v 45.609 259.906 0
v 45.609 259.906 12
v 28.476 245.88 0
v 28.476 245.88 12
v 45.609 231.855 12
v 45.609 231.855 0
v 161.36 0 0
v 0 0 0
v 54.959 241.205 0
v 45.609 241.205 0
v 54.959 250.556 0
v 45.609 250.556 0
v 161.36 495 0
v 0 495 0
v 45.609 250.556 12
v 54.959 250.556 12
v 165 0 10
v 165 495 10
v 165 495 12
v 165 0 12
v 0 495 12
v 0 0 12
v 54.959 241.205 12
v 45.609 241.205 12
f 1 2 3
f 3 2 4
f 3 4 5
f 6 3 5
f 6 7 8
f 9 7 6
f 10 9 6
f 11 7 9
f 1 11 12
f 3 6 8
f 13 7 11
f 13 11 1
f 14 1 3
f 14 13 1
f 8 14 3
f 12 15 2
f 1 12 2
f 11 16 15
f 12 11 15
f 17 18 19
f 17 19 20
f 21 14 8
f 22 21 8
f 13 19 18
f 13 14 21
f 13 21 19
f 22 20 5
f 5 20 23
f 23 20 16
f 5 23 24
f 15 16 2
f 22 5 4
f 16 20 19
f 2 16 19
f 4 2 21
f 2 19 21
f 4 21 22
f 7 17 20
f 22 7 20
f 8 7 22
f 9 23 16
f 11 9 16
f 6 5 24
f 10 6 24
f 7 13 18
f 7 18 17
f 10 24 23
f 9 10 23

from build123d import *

# Parameters (mm, degrees)
PAD_DEPTH     = 12
POCKET_DEPTH  = 12.001
CHAMFER_ANGLE = 20
CHAMFER_SIZE  = 10


with BuildPart() as part:
    # Sketch → Pad (new body)
    with BuildSketch(Plane.XY):
        Polygon((0, 495), (165, 495), (165, 0), (0, 0), (0, 247.5), align=None)
    extrude(amount=PAD_DEPTH)

    # Sketch001 (on Face7 of Pad) → Pocket (cut, through all)
    with BuildSketch(Plane.XY.offset(12)):
        Polygon((45.608967, 259.905869), (28.476261, 245.880386), (45.608967, 231.854903), (45.608967, 241.205225), (54.959289, 241.205225), (54.959289, 250.555547), (45.608967, 250.555547), align=None)
    extrude(amount=-POCKET_DEPTH, mode=Mode.SUBTRACT)

    # Chamfer
    chamfer_edges = [part.edges().sort_by_distance(p)[0] for p in [
        (165, 247.5, 0),
    ]]
    chamfer_side = part.faces().sort_by_distance((165, 247.5, 6))[0]
    chamfer(chamfer_edges, length=CHAMFER_SIZE, angle=CHAMFER_ANGLE, reference=chamfer_side)


solid = part.part
